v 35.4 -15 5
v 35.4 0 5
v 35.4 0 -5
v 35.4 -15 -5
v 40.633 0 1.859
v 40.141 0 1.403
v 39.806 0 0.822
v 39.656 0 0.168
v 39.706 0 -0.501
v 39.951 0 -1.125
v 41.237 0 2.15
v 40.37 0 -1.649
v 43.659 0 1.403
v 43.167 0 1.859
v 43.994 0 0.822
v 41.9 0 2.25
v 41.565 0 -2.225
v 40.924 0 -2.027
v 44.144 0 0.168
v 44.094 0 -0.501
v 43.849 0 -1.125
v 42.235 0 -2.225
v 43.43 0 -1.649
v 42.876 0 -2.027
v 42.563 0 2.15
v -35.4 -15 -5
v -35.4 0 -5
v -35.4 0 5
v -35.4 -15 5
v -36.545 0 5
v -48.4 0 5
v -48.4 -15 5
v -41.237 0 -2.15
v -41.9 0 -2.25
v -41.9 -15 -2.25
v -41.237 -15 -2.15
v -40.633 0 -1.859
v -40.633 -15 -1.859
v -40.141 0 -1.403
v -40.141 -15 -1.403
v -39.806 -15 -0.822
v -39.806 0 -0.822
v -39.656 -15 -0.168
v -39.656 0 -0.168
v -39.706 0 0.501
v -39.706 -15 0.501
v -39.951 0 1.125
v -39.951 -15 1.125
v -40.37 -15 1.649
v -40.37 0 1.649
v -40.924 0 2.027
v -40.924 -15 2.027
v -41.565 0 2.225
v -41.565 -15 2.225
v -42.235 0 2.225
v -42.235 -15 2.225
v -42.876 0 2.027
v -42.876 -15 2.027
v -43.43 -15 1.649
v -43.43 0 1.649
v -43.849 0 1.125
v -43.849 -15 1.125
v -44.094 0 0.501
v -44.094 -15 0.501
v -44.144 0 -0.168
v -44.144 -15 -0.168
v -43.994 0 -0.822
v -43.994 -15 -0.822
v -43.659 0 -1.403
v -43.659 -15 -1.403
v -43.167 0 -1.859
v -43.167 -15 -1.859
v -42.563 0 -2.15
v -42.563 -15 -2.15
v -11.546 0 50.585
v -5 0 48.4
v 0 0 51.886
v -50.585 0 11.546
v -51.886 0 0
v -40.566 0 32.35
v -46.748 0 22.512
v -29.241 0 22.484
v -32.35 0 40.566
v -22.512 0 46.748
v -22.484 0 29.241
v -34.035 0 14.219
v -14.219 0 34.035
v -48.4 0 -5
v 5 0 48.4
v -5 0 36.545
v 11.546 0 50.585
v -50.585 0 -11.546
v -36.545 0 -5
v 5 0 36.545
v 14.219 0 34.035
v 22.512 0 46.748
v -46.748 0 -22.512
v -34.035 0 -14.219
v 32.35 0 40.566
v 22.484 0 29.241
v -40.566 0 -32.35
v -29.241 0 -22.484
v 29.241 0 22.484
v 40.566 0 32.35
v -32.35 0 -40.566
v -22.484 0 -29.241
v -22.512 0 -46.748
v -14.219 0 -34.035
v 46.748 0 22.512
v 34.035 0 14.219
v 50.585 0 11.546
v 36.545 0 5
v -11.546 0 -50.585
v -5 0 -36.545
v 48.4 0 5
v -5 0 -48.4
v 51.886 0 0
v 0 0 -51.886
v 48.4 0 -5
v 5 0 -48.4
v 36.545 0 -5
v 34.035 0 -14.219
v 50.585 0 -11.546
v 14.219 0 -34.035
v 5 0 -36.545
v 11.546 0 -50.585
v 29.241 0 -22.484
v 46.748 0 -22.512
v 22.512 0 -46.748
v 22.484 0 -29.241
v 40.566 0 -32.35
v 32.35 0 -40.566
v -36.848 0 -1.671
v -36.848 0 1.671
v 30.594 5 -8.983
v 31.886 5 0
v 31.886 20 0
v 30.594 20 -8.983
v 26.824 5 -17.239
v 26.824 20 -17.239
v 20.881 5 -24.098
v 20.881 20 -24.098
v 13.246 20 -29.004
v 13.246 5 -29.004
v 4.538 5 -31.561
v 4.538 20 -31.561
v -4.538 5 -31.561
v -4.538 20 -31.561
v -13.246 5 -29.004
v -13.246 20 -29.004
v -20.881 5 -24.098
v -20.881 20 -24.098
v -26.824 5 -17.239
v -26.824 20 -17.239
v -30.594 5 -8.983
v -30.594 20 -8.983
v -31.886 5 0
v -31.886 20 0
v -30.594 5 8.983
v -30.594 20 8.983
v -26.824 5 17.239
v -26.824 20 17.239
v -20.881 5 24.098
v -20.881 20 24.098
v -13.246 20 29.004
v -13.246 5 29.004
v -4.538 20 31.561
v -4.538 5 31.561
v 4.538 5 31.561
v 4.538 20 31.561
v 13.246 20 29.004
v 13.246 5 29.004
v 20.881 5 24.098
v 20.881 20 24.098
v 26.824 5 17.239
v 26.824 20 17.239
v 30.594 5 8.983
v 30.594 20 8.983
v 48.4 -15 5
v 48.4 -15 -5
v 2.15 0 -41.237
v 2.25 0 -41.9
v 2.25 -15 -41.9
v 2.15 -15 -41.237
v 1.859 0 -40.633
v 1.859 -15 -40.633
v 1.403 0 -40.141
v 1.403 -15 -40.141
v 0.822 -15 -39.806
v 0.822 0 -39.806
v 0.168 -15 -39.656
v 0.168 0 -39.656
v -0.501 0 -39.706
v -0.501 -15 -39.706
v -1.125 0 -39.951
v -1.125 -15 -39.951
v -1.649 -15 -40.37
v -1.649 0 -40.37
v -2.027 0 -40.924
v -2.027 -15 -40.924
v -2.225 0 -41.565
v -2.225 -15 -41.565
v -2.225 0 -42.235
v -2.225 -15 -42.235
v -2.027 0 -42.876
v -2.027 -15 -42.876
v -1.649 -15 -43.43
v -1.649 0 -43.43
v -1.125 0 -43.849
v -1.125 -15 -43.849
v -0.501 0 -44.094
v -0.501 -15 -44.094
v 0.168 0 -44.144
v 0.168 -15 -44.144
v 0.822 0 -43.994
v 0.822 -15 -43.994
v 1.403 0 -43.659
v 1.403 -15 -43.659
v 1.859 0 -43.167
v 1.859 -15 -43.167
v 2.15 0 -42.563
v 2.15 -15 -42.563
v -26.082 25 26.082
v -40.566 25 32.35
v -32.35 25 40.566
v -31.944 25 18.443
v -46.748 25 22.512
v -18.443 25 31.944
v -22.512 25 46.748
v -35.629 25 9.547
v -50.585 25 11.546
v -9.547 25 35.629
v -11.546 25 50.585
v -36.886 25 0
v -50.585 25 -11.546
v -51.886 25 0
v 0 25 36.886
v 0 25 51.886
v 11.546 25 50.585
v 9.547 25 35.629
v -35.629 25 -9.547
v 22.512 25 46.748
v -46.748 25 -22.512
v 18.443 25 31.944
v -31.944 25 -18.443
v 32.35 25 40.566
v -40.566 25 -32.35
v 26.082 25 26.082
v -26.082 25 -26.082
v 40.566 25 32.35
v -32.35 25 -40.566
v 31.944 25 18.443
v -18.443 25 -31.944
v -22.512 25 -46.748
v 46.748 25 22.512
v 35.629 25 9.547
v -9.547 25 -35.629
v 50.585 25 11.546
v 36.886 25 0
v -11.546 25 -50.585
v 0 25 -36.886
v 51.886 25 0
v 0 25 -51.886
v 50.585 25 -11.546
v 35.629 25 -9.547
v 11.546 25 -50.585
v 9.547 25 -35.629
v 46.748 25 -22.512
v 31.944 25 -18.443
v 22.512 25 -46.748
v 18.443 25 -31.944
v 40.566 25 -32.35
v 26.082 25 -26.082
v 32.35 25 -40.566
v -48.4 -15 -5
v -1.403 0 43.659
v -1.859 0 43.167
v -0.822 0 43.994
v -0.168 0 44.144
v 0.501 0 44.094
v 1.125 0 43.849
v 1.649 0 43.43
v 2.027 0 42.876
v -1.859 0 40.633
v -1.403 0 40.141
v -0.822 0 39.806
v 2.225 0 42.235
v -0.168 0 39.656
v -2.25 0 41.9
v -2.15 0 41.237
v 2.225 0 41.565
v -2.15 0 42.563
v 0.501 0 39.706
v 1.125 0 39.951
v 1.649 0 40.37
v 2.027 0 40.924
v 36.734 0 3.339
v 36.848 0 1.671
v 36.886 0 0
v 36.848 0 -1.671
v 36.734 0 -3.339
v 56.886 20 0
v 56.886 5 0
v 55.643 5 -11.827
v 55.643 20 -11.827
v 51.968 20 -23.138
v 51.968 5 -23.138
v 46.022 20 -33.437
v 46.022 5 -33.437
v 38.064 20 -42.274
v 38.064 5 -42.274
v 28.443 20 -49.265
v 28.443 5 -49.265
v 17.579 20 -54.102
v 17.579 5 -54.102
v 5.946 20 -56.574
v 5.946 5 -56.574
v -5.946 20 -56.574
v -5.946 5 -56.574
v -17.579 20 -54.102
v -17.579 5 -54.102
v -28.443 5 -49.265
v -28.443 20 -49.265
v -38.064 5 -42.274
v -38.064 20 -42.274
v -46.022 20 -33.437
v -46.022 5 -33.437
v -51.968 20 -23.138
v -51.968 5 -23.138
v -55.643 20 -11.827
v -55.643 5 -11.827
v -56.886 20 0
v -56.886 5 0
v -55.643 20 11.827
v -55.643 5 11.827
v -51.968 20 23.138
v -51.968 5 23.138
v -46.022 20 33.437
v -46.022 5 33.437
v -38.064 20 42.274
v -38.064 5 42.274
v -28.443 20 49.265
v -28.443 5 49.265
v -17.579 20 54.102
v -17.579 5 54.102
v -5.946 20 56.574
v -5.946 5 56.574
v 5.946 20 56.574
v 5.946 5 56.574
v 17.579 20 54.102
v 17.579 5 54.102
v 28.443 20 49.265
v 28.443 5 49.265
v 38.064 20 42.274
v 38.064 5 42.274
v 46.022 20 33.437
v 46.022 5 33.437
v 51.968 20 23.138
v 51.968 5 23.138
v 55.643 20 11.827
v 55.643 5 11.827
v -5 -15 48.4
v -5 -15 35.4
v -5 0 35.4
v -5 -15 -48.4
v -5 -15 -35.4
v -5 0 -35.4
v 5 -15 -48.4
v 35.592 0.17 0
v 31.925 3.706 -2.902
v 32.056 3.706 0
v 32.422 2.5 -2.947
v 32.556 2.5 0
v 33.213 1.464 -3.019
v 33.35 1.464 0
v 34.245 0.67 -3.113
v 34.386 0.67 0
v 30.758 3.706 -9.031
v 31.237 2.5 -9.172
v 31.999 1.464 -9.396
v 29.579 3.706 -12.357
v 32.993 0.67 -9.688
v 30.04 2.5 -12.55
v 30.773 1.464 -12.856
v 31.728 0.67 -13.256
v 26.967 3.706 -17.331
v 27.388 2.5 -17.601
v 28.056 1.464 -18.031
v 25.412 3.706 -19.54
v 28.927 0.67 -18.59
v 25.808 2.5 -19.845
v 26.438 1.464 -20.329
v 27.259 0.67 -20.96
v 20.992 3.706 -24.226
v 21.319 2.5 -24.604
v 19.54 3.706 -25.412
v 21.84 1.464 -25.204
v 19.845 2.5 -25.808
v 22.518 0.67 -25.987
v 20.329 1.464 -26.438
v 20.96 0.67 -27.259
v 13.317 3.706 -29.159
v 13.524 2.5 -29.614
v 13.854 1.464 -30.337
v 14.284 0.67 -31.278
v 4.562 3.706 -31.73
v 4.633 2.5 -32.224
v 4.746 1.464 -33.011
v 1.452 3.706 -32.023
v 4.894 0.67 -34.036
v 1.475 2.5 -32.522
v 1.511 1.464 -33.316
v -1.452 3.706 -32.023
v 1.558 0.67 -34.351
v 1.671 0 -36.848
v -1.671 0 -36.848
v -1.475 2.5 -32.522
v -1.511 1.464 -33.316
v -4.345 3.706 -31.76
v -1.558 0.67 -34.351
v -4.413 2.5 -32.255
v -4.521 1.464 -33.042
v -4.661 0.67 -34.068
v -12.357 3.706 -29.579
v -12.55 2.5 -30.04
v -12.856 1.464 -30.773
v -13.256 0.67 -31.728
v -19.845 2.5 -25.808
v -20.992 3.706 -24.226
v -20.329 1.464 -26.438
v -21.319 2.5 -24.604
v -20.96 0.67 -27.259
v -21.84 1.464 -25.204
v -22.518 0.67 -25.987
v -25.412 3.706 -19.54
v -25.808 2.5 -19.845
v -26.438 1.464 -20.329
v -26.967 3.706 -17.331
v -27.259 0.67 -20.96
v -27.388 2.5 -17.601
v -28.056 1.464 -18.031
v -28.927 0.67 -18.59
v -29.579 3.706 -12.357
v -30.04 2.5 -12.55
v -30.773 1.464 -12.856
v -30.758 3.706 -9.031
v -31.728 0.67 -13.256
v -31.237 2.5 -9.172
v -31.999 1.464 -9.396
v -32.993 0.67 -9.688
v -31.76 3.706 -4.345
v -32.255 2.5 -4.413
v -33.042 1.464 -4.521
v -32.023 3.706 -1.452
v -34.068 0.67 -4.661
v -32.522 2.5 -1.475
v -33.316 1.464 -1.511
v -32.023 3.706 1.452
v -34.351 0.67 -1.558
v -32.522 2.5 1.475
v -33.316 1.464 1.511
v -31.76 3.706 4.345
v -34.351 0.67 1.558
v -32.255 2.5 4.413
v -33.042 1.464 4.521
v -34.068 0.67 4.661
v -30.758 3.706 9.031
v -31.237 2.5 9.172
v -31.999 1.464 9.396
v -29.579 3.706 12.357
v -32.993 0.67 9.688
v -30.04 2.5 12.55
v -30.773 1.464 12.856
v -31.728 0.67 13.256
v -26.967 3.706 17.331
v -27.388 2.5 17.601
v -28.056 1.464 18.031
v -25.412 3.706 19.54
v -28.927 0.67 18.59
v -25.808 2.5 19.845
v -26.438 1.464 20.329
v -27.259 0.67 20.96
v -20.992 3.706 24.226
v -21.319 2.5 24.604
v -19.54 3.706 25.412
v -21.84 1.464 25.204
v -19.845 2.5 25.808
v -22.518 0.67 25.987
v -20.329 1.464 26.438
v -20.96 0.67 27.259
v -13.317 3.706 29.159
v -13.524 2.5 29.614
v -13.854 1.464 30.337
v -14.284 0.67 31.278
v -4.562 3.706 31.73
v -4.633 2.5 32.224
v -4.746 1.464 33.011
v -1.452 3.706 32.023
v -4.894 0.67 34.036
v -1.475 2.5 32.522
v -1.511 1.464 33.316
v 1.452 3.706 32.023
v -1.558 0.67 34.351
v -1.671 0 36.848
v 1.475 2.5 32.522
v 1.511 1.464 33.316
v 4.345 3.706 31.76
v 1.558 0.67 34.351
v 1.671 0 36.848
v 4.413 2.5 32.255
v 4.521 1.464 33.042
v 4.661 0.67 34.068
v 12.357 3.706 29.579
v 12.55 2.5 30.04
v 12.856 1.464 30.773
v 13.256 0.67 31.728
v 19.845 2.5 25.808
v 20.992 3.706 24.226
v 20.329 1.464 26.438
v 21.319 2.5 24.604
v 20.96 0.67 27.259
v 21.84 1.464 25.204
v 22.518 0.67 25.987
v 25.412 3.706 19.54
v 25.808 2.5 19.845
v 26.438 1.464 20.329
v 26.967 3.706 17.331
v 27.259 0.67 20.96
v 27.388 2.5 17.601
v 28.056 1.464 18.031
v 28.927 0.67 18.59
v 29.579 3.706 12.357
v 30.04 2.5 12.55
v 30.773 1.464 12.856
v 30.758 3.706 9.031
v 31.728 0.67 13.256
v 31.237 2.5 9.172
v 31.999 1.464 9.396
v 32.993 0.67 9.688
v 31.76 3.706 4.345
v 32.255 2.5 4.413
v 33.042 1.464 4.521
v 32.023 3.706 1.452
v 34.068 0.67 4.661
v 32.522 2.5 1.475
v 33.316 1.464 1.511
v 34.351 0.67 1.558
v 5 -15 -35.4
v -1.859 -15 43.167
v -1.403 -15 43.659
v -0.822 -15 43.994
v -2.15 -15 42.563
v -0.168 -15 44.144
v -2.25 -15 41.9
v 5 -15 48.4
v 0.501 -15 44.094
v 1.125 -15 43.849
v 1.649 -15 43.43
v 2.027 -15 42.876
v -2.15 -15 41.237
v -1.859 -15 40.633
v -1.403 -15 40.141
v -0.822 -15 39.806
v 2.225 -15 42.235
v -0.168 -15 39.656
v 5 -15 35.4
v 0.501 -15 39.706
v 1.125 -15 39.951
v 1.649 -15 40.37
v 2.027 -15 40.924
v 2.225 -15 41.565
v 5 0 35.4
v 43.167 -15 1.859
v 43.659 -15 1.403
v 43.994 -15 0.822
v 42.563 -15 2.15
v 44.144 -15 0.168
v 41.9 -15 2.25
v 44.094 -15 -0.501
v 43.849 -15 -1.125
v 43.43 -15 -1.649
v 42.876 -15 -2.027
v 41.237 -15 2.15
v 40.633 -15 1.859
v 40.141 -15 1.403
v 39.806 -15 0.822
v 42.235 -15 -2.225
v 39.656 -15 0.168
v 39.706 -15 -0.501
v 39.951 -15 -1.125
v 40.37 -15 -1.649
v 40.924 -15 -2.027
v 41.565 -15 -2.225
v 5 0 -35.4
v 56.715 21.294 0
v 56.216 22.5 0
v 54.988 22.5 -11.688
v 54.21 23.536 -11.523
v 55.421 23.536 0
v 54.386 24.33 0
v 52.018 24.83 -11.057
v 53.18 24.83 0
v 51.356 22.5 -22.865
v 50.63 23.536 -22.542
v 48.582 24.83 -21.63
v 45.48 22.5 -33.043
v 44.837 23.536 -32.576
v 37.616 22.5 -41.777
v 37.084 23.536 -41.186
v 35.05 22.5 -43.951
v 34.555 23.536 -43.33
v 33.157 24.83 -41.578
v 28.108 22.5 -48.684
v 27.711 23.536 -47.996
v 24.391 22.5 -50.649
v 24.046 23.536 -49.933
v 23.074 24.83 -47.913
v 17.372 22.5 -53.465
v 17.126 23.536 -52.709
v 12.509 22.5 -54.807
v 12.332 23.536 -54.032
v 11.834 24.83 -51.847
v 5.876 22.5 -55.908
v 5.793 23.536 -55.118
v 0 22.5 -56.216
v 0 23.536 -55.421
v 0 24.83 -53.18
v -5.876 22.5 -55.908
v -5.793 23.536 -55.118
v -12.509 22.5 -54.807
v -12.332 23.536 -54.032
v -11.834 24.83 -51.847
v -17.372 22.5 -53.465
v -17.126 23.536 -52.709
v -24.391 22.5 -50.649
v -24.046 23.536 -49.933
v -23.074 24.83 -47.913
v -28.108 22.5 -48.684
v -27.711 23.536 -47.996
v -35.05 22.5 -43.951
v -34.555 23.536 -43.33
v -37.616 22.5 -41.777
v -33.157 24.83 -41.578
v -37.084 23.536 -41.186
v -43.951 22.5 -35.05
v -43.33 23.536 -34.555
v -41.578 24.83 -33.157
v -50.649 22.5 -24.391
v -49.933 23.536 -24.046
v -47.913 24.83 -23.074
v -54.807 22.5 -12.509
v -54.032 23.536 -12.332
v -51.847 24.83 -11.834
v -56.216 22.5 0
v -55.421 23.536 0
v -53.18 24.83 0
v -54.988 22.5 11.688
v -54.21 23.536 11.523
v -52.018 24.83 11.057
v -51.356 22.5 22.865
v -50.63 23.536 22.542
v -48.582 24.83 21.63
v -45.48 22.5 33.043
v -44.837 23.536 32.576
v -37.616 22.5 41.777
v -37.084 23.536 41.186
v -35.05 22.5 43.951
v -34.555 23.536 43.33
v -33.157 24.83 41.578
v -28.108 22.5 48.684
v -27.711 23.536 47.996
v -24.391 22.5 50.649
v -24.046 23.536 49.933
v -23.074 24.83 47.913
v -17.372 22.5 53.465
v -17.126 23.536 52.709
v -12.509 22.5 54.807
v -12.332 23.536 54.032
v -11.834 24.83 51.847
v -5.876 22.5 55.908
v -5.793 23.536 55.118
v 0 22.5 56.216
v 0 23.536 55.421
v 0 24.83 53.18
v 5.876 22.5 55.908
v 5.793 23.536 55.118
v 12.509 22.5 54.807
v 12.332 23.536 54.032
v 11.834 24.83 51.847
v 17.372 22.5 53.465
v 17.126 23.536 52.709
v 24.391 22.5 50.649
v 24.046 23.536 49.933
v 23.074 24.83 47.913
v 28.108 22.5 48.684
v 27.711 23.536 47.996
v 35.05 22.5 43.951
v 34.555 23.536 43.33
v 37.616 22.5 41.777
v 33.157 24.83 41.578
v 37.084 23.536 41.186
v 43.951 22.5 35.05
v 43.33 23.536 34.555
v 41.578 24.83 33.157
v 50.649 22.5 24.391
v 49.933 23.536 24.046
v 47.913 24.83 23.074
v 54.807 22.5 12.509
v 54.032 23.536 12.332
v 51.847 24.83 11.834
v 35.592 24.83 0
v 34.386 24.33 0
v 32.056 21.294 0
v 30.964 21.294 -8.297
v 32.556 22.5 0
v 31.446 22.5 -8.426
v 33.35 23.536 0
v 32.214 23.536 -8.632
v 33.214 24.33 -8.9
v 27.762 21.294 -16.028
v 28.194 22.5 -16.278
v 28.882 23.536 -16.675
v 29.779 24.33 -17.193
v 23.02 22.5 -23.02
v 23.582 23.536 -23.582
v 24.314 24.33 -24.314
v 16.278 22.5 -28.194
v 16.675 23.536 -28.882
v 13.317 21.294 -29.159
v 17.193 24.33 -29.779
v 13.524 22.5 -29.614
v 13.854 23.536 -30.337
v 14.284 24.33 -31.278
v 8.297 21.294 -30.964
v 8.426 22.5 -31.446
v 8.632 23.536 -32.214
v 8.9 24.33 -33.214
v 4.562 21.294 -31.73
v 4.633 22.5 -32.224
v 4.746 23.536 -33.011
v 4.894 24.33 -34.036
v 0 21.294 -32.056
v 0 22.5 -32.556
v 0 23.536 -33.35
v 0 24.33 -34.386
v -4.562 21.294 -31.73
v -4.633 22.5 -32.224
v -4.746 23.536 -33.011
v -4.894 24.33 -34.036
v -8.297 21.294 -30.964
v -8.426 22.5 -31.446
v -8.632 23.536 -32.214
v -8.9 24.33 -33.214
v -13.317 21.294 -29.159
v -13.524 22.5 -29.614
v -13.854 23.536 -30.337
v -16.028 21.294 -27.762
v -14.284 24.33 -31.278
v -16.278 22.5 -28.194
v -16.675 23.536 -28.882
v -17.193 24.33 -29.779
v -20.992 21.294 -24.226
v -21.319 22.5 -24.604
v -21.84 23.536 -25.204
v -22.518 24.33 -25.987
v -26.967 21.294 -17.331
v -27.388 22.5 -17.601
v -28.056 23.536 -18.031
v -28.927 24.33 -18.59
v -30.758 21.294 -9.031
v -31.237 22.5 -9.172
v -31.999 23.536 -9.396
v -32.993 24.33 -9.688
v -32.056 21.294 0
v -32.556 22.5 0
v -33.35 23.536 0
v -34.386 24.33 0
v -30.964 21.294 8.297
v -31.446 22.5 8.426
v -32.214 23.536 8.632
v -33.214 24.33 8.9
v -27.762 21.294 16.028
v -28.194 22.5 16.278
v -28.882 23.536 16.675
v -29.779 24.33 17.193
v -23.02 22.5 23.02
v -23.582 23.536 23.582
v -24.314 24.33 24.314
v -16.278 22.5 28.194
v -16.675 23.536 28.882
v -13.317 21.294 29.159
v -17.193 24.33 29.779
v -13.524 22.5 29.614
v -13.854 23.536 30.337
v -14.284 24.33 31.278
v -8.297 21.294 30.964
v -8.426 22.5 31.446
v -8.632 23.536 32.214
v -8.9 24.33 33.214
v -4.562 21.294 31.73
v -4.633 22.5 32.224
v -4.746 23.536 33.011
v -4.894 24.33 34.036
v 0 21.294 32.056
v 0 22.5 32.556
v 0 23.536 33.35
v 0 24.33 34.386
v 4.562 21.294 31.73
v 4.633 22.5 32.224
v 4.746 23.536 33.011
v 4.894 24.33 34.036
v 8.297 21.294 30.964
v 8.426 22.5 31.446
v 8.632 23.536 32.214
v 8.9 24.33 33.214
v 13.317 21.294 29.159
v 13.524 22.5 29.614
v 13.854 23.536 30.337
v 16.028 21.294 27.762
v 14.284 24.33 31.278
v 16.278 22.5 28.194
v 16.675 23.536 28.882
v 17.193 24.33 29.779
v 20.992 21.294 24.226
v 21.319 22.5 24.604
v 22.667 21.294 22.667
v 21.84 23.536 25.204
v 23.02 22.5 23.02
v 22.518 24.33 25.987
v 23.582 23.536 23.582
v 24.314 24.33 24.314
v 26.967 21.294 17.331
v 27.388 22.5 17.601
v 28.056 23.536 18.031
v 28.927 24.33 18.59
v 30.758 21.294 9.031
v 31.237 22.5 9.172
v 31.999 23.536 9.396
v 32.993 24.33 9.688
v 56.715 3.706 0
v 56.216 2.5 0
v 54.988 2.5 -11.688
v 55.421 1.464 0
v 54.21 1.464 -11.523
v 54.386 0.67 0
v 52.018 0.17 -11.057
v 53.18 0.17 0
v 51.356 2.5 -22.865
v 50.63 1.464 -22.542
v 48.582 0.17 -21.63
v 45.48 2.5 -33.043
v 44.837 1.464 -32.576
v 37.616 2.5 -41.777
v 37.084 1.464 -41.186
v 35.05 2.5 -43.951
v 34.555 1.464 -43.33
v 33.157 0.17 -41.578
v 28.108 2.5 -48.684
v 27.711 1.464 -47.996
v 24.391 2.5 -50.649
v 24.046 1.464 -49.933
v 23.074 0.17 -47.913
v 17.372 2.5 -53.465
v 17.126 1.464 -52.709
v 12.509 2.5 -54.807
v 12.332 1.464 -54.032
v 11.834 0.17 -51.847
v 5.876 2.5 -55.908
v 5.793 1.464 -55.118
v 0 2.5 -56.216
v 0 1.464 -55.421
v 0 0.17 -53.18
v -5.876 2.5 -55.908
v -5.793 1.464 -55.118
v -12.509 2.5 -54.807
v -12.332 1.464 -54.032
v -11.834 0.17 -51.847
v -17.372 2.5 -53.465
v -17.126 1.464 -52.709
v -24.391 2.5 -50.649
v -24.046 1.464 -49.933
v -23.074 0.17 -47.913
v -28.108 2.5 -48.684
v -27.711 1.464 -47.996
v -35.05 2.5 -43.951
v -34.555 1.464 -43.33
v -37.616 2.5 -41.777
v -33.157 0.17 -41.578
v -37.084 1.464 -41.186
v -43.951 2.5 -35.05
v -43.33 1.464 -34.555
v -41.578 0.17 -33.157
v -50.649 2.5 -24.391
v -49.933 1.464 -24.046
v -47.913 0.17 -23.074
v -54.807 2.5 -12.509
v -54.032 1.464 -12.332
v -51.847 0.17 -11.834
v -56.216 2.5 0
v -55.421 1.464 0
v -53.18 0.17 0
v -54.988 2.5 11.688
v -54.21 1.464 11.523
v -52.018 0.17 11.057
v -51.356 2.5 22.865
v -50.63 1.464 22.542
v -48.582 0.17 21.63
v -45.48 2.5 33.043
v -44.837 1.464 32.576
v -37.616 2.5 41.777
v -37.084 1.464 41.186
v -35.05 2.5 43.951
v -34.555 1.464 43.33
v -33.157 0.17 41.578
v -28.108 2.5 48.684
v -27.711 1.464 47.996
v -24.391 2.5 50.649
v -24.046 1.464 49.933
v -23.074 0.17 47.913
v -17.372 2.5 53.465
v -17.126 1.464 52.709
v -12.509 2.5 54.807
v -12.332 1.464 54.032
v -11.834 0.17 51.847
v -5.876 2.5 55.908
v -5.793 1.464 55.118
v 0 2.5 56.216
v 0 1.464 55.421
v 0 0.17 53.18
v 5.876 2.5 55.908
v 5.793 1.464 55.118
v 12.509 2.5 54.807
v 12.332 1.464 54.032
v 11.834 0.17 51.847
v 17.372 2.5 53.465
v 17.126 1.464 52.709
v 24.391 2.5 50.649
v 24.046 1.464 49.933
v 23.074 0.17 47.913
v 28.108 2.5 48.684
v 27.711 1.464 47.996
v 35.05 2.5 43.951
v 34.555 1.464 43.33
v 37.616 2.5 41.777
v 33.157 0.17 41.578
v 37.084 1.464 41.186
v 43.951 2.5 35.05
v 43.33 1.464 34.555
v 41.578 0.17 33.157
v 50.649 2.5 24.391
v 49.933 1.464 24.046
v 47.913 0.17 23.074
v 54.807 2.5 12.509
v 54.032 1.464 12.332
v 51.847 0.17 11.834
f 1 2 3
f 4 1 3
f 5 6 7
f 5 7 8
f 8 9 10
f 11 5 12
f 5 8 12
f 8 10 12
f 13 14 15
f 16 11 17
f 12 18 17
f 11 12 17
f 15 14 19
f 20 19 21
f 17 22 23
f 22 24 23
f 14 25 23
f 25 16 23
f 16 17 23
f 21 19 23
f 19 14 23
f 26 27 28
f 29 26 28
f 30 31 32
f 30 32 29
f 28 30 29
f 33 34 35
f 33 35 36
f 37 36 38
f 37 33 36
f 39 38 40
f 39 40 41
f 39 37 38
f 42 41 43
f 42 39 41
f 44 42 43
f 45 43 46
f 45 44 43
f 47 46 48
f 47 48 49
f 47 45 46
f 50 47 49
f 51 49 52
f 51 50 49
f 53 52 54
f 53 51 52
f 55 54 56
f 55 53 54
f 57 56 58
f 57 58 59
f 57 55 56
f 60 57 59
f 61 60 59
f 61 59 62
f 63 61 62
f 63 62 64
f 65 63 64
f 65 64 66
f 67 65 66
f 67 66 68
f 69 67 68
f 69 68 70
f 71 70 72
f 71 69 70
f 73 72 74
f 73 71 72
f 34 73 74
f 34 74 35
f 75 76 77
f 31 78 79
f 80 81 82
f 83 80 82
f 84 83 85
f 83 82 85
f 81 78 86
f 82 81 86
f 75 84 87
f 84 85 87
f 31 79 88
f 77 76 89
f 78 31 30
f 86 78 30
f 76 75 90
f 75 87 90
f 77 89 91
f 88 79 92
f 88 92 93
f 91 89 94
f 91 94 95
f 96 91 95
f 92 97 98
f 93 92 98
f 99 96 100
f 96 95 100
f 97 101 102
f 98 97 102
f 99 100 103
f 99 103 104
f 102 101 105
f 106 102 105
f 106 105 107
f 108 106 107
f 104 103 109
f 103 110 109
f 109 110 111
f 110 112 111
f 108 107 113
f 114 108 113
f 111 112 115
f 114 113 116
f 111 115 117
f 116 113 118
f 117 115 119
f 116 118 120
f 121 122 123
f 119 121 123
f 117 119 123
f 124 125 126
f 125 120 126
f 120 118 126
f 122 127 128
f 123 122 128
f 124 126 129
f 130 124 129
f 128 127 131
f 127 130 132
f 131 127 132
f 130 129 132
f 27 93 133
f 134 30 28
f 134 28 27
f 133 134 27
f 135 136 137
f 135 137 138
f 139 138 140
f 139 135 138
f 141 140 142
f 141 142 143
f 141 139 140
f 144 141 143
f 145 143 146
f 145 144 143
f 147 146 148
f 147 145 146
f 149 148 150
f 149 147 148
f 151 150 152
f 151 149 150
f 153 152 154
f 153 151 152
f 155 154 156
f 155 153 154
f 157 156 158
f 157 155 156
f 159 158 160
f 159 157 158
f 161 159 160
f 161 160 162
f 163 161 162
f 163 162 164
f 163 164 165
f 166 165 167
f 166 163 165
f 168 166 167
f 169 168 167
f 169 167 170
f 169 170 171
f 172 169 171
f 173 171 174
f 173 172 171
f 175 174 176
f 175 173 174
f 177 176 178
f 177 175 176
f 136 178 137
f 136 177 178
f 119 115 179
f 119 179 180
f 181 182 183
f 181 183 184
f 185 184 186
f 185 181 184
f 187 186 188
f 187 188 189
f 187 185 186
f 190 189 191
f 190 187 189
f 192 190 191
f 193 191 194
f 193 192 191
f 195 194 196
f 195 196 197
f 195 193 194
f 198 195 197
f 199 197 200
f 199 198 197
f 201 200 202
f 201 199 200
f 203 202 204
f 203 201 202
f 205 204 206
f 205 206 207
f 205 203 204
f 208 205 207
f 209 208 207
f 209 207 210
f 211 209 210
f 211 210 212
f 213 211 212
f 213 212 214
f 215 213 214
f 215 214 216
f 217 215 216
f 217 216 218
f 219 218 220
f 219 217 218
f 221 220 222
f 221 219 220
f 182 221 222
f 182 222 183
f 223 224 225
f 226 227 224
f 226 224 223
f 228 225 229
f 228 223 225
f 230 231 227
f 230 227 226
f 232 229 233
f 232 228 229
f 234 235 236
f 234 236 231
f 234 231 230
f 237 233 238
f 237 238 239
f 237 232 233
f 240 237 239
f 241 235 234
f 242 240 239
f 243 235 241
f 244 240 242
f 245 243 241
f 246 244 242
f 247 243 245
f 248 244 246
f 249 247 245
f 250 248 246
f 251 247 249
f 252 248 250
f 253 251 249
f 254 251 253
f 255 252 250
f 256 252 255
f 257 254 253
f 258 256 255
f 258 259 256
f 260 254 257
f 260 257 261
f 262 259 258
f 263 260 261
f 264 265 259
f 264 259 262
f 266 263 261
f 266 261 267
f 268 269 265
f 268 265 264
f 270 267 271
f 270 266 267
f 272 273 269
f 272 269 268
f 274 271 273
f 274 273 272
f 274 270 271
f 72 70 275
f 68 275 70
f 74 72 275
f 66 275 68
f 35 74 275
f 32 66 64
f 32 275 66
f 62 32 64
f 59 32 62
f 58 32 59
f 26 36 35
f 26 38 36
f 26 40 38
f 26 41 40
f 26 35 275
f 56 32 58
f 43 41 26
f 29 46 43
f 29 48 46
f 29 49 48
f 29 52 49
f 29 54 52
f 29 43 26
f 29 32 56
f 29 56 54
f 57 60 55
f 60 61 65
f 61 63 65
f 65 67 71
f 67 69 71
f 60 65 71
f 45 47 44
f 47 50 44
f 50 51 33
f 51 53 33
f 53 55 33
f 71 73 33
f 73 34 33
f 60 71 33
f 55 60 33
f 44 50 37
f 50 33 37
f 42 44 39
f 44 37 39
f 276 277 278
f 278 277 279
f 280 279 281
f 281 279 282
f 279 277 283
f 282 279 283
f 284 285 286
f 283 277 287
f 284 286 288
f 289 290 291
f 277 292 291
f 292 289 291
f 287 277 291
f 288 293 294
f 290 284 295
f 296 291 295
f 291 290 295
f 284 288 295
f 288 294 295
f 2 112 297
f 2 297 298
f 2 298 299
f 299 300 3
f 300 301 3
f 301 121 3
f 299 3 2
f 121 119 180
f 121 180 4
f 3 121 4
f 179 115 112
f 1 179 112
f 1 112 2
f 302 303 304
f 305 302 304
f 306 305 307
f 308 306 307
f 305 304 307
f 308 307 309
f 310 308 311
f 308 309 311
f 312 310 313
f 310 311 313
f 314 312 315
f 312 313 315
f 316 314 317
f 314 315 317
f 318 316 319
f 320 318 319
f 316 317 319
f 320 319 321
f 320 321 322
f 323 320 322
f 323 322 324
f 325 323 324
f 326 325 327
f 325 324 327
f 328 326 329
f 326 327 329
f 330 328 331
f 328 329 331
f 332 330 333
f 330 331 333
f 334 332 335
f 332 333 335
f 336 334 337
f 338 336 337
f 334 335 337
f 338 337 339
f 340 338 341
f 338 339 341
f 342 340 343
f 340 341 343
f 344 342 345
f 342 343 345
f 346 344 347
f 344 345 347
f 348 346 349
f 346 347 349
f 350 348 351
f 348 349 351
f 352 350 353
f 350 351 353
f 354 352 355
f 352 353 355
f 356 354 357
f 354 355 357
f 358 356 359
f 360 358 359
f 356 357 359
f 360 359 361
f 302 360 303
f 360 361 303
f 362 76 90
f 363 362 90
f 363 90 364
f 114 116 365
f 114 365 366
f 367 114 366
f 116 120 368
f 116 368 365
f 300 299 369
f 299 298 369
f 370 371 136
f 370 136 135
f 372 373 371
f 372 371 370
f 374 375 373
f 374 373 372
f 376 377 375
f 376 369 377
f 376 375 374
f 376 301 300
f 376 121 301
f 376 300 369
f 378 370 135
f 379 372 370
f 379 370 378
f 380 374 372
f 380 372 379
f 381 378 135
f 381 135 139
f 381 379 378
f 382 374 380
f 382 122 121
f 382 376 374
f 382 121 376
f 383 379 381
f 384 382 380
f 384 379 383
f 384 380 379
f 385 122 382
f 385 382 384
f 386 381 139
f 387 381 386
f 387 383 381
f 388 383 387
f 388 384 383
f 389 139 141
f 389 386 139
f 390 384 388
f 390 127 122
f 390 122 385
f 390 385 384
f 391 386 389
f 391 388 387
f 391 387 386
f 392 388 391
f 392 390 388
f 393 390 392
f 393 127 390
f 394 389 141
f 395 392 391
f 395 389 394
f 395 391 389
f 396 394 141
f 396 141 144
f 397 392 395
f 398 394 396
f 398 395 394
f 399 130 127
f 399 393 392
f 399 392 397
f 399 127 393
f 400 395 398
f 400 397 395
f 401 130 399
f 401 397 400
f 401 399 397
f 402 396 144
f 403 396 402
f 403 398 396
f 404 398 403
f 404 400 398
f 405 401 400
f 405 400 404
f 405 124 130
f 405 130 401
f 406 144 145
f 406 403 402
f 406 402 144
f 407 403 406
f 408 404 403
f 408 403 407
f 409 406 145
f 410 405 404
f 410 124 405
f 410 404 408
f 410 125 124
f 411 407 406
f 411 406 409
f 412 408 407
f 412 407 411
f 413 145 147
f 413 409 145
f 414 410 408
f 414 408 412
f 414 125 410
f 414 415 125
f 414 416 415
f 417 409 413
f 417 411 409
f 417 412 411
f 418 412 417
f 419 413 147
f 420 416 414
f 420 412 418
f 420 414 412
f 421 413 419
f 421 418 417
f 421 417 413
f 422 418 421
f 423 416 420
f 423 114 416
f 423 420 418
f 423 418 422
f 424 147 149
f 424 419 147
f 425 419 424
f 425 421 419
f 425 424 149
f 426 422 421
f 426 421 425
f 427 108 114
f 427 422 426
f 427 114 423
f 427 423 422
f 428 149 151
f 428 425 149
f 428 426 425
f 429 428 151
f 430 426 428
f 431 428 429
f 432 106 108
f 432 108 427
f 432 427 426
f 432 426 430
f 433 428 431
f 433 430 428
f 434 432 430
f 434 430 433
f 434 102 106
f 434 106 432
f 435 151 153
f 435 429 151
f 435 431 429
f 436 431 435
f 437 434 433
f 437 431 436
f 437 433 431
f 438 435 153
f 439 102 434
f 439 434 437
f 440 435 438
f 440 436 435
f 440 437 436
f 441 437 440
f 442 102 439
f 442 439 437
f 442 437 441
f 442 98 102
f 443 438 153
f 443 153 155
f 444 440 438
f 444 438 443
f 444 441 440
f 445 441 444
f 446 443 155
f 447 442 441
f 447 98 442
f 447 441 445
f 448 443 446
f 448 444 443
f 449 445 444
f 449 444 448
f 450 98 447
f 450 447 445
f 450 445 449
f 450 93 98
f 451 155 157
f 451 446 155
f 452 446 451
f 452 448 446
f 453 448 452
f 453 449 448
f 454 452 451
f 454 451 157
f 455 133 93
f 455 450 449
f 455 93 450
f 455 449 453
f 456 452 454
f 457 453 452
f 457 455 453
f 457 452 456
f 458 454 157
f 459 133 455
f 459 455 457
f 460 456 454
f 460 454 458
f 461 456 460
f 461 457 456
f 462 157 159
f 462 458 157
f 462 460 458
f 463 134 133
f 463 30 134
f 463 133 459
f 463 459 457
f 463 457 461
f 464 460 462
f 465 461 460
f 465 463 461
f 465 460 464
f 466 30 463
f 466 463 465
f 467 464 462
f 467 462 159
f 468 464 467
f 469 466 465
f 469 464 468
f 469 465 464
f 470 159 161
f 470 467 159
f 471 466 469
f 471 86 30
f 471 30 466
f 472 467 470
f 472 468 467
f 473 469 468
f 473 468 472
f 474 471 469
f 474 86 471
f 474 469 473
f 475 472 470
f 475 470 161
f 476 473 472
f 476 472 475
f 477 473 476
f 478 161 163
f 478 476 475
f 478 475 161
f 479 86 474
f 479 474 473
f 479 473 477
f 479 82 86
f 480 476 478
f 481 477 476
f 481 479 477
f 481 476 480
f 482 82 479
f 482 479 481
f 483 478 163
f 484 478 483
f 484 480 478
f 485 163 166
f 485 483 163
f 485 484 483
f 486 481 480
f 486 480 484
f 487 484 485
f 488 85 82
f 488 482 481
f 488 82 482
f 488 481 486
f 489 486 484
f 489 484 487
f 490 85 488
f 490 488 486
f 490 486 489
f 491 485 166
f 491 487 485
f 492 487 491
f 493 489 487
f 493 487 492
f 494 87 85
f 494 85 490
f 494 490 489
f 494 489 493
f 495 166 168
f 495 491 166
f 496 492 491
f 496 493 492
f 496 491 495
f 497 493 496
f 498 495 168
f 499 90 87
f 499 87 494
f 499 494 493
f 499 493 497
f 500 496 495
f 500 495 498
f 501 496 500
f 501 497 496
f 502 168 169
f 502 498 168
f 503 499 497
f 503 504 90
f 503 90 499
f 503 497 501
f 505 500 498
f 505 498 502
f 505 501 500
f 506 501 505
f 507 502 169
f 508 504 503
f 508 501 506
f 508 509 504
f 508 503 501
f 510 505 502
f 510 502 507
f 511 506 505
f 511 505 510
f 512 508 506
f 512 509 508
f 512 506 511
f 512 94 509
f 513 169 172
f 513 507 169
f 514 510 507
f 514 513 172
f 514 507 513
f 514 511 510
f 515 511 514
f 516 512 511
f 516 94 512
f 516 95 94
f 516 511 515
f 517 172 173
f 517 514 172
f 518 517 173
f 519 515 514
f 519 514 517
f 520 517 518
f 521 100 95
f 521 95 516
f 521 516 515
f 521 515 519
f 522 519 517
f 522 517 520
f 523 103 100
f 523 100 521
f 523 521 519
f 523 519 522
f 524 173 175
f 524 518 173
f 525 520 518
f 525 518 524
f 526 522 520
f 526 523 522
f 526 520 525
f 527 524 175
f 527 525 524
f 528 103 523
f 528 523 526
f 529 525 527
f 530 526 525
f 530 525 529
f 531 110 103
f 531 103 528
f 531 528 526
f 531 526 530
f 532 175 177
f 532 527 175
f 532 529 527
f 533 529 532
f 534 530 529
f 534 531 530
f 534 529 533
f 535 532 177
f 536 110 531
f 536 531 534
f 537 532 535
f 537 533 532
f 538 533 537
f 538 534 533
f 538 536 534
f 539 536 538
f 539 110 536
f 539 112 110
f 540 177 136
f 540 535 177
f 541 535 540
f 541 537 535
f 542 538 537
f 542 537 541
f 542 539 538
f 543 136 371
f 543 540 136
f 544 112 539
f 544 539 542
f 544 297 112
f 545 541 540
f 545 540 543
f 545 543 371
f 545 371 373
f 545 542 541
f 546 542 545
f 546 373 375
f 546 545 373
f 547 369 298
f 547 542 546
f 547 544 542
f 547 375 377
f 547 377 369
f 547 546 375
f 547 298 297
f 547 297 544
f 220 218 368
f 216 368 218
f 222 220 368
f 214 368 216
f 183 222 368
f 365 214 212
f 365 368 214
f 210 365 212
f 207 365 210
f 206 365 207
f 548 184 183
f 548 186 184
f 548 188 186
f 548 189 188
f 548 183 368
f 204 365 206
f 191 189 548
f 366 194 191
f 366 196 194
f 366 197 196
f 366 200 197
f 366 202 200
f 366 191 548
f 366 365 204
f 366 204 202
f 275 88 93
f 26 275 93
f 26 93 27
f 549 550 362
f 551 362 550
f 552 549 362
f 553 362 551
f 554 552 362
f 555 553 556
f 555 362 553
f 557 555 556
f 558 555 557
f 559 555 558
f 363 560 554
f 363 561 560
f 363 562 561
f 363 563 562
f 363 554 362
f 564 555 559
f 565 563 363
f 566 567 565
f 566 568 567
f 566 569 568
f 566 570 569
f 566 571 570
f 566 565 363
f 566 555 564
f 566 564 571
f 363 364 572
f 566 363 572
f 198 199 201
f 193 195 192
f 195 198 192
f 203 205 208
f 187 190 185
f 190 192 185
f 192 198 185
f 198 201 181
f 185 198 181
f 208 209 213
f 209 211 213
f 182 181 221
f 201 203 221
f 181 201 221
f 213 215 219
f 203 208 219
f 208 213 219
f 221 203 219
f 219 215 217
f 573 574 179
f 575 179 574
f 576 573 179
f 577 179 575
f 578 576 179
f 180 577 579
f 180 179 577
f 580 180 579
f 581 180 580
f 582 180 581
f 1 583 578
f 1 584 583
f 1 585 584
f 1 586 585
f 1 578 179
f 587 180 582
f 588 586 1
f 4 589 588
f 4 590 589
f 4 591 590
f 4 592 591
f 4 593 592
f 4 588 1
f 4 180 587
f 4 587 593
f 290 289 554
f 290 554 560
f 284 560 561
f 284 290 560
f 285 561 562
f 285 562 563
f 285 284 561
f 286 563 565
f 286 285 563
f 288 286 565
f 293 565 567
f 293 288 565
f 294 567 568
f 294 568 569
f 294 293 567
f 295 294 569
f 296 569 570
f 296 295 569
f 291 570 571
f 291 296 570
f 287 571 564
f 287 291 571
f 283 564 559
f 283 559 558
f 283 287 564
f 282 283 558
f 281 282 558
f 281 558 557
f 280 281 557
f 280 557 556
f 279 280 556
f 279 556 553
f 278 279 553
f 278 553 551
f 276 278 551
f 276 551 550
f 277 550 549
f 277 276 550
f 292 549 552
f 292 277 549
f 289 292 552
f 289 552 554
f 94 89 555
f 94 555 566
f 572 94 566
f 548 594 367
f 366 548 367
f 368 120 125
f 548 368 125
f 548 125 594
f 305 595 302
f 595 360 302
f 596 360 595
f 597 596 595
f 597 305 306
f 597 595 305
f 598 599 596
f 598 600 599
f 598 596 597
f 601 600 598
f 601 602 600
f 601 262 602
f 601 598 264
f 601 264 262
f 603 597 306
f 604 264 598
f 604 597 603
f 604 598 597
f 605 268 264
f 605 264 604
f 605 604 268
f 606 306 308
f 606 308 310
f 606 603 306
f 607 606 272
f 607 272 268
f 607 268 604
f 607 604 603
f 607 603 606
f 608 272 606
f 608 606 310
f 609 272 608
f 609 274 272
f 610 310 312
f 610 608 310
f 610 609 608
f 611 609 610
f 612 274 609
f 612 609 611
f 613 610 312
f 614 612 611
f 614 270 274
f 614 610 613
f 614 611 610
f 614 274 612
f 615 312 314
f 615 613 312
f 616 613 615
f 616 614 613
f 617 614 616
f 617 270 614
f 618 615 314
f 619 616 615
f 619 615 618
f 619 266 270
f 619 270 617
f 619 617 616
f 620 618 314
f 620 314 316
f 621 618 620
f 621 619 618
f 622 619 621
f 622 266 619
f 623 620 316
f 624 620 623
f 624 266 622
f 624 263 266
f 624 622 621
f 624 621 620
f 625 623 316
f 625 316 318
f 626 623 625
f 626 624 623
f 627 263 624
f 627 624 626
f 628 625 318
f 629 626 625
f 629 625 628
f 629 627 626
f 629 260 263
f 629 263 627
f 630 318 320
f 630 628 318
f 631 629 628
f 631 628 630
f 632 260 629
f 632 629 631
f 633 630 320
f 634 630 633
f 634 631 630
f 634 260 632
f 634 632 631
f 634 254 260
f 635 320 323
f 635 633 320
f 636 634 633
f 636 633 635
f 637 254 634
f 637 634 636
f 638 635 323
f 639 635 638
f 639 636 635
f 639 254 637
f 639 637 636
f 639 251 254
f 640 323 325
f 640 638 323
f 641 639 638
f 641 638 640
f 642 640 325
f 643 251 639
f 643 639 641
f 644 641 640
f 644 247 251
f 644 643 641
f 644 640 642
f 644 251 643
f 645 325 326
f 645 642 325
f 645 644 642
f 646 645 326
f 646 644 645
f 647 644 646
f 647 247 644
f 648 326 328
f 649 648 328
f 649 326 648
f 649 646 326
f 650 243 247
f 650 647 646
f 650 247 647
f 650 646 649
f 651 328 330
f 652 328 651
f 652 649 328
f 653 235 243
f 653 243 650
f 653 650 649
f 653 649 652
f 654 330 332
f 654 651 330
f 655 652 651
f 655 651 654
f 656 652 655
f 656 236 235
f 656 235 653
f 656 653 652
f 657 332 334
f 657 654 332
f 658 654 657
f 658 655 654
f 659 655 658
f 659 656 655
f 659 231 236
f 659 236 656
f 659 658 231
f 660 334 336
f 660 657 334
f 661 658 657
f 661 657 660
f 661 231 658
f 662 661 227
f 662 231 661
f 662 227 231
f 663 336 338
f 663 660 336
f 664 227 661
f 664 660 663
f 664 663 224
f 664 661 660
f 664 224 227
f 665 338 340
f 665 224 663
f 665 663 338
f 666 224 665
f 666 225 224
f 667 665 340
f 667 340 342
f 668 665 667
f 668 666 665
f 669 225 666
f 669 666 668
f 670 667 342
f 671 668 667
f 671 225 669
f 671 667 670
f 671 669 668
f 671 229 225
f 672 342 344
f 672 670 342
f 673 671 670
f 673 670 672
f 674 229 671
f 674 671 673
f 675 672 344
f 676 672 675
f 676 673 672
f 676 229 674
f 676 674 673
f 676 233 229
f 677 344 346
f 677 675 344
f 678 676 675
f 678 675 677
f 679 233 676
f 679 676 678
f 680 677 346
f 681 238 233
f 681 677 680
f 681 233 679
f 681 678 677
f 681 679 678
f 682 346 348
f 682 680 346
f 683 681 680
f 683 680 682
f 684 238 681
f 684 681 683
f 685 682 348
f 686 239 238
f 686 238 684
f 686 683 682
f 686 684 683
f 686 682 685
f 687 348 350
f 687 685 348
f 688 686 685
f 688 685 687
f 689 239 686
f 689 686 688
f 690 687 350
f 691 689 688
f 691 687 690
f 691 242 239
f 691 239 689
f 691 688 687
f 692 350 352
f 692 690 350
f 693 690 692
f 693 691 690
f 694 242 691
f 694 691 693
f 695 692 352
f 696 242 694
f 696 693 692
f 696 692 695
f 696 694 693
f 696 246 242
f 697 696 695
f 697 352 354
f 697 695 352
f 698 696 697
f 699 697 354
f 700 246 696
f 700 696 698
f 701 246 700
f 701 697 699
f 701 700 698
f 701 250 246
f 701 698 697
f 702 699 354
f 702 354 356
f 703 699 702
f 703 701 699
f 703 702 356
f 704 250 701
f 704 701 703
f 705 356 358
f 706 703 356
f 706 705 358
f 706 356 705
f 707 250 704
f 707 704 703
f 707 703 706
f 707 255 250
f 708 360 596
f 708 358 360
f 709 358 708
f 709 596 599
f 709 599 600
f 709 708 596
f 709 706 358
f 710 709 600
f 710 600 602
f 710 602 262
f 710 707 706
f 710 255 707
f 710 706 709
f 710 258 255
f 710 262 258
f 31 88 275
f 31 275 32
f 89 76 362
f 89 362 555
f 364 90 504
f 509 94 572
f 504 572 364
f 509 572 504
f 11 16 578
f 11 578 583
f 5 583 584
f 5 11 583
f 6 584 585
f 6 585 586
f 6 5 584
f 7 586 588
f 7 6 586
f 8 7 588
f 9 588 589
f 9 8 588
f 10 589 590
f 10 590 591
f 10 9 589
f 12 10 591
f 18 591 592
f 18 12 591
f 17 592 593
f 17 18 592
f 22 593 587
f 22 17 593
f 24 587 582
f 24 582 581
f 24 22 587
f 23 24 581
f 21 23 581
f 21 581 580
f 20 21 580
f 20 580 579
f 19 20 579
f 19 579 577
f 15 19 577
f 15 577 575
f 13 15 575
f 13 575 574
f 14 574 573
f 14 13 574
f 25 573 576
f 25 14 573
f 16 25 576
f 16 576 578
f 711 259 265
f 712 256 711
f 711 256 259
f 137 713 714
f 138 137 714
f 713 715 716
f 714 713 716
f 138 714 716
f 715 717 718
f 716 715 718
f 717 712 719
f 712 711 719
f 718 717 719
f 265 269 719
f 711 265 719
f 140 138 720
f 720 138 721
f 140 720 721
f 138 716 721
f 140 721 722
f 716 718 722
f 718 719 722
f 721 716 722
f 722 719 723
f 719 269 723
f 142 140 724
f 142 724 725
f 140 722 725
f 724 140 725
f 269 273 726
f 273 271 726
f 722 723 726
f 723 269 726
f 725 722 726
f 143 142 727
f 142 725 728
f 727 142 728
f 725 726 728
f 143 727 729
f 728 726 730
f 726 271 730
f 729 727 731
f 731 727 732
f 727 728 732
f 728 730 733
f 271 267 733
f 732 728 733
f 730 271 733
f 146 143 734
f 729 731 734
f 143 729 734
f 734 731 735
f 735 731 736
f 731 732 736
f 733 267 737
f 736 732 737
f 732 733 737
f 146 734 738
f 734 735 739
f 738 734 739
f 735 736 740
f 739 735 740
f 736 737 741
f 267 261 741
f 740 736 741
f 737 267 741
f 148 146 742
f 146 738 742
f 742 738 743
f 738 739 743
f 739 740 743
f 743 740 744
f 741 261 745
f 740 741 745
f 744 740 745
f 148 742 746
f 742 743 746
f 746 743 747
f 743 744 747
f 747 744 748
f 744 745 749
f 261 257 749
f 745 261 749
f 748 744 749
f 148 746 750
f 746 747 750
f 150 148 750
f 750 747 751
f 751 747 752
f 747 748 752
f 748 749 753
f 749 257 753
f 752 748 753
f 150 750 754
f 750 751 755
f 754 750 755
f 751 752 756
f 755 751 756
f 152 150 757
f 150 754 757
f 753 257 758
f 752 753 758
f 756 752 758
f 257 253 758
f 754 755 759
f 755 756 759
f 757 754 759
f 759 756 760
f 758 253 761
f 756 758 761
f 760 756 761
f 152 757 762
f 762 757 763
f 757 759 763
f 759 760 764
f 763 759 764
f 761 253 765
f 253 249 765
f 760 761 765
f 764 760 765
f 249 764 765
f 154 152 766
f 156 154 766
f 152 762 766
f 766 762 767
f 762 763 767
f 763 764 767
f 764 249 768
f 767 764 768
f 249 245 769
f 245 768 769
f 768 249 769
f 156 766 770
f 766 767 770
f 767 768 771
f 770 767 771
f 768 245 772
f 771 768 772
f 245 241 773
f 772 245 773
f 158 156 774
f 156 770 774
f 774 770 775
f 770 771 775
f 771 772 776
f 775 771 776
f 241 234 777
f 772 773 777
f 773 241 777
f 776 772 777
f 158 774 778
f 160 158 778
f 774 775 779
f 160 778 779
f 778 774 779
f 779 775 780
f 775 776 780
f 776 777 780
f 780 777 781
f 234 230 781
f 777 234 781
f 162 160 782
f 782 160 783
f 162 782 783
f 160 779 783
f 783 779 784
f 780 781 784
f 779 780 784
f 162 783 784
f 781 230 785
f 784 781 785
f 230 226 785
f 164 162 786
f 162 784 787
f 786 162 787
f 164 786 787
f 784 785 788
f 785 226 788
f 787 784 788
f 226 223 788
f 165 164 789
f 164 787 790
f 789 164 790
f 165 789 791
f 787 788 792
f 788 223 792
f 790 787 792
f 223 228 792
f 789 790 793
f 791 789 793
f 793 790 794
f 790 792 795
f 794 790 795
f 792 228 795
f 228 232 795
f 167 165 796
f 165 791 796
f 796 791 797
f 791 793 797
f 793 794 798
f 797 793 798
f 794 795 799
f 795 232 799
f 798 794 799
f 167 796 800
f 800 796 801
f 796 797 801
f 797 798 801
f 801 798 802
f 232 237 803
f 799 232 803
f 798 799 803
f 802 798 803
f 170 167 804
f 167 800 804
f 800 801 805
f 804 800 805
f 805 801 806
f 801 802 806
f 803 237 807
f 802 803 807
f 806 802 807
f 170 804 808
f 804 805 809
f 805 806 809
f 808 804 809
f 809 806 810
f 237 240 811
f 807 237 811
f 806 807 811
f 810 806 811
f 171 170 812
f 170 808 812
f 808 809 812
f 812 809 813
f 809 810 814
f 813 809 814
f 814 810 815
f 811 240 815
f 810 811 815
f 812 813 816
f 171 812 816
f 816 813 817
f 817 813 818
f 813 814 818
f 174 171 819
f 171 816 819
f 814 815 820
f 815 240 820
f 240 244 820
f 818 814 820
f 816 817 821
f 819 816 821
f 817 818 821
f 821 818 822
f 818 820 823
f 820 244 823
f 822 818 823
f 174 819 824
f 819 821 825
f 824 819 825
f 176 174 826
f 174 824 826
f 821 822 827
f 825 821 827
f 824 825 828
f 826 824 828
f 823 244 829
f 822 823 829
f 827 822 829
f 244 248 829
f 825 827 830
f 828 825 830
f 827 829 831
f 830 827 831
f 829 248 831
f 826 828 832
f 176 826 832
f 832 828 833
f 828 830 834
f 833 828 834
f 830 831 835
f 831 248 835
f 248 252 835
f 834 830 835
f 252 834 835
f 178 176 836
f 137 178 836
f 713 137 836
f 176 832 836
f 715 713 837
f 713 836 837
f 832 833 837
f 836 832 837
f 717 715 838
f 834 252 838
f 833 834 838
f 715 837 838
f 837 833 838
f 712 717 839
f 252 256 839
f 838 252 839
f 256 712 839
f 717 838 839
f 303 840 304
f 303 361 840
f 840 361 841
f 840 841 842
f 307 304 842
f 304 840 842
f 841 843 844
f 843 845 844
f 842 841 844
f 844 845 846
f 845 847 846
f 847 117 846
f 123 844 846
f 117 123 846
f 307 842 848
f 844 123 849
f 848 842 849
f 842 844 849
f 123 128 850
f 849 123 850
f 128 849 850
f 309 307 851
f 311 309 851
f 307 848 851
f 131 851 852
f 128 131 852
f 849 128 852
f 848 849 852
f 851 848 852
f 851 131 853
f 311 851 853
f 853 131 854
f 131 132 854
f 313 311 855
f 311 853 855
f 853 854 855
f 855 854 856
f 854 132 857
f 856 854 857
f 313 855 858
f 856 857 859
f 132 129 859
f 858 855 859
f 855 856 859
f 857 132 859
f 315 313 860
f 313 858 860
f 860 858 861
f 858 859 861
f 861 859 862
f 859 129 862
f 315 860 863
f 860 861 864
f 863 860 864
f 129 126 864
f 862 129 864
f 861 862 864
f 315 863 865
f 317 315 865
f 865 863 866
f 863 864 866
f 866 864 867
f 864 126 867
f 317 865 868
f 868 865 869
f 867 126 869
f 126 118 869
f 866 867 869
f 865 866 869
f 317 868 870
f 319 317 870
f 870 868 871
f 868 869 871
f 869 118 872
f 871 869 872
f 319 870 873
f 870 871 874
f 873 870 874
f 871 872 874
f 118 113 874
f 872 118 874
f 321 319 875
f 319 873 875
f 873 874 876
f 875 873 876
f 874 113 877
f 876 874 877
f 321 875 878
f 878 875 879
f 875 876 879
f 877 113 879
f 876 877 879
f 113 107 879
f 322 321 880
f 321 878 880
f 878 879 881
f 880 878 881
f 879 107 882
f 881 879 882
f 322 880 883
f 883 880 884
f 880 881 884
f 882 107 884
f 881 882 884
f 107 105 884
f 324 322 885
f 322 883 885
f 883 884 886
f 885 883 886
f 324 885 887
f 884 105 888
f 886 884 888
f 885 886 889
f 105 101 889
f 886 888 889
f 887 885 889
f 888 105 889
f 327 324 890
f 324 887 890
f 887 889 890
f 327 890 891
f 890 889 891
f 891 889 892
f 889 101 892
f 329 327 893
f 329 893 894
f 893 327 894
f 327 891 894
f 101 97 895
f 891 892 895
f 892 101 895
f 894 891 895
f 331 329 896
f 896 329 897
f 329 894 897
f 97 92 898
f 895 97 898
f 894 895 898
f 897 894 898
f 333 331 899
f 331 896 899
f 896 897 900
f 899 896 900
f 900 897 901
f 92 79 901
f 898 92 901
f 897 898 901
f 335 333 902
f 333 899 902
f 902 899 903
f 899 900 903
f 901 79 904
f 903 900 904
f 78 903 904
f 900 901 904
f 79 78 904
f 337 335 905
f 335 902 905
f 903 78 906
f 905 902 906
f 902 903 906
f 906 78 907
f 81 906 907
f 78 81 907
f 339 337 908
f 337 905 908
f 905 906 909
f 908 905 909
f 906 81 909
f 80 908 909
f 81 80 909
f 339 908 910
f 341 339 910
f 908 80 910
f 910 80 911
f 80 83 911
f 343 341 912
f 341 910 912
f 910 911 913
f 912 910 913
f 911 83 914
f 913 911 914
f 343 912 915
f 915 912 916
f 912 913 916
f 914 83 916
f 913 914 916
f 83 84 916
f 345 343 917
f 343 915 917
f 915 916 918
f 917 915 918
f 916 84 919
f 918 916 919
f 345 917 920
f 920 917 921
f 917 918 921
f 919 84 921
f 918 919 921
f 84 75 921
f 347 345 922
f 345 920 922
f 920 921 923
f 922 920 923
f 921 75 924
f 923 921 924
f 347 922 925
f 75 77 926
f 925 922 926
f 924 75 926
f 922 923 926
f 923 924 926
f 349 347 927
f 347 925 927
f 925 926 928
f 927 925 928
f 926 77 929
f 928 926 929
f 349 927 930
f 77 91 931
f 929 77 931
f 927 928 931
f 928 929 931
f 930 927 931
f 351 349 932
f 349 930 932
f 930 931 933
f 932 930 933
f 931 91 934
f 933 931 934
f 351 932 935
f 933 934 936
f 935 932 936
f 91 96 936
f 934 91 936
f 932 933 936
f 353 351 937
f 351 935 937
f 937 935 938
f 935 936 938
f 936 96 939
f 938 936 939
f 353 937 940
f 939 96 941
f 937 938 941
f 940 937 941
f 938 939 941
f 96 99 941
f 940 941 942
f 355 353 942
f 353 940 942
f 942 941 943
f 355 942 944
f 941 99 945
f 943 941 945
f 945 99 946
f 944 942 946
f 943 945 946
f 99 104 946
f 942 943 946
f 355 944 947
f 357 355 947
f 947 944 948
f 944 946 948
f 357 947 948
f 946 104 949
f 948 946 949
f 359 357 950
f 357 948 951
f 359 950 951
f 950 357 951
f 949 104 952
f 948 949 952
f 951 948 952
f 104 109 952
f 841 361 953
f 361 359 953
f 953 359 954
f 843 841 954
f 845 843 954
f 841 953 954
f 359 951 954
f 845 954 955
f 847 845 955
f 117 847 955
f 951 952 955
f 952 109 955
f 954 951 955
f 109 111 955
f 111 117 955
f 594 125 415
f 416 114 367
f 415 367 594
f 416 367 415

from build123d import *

# Parameters (mm, degrees)
SKETCH_1_R               = 56.885850613
SKETCH_1_R_2             = 31.885850613
EXTRUDE_1_DEPTH          = 25
FILLET_1_R               = 5
SKETCH_2_W               = 13
SKETCH_2_H               = 10
SKETCH_2_R               = 2.25
EXTRUDE_1_2_DEPTH        = 15
PATTERN_CIRCULAR_1_COUNT = 4


with BuildPart() as part:
    # Эскиз1 → Extrude 1 (new body)
    with BuildSketch(Plane(origin=(0, 0, 16.5), x_dir=(1, 0, 0), z_dir=(0, 1, 0))):
        with Locations((0, 16.5)):
            Circle(SKETCH_1_R)
        with Locations((0, 16.5)):
            Circle(SKETCH_1_R_2, mode=Mode.SUBTRACT)
    extrude(amount=EXTRUDE_1_DEPTH)

    # Скругление1
    fillet_1_edges = [part.edges().sort_by_distance(p)[0] for p in [
        (-56.885850613, 0, 0),
        (-56.885850613, 25, 0),
        (-31.885850613, 0, 0),
        (-31.885850613, 25, 0),
    ]]
    fillet(fillet_1_edges, radius=FILLET_1_R)

    # Эскиз2 → Extrude 1 2 (add)
    with BuildSketch(Plane.XZ):
        with Locations((-41.9, 0)):
            Rectangle(SKETCH_2_W, SKETCH_2_H)
        with Locations(Location((-41.9, 0, 0), (0, 0, 270))):
            Circle(SKETCH_2_R, mode=Mode.SUBTRACT)
    extrude_1_2 = extrude(amount=EXTRUDE_1_2_DEPTH)

    # Круговой массив1: Extrude 1 2 ×4 about axis
    pattern_circular_1_axis = Axis((0, 0, 0), (0, 1, 0))
    for i in range(1, PATTERN_CIRCULAR_1_COUNT):
        add(extrude_1_2.rotate(pattern_circular_1_axis, i * 360 / PATTERN_CIRCULAR_1_COUNT))


solid = part.part
